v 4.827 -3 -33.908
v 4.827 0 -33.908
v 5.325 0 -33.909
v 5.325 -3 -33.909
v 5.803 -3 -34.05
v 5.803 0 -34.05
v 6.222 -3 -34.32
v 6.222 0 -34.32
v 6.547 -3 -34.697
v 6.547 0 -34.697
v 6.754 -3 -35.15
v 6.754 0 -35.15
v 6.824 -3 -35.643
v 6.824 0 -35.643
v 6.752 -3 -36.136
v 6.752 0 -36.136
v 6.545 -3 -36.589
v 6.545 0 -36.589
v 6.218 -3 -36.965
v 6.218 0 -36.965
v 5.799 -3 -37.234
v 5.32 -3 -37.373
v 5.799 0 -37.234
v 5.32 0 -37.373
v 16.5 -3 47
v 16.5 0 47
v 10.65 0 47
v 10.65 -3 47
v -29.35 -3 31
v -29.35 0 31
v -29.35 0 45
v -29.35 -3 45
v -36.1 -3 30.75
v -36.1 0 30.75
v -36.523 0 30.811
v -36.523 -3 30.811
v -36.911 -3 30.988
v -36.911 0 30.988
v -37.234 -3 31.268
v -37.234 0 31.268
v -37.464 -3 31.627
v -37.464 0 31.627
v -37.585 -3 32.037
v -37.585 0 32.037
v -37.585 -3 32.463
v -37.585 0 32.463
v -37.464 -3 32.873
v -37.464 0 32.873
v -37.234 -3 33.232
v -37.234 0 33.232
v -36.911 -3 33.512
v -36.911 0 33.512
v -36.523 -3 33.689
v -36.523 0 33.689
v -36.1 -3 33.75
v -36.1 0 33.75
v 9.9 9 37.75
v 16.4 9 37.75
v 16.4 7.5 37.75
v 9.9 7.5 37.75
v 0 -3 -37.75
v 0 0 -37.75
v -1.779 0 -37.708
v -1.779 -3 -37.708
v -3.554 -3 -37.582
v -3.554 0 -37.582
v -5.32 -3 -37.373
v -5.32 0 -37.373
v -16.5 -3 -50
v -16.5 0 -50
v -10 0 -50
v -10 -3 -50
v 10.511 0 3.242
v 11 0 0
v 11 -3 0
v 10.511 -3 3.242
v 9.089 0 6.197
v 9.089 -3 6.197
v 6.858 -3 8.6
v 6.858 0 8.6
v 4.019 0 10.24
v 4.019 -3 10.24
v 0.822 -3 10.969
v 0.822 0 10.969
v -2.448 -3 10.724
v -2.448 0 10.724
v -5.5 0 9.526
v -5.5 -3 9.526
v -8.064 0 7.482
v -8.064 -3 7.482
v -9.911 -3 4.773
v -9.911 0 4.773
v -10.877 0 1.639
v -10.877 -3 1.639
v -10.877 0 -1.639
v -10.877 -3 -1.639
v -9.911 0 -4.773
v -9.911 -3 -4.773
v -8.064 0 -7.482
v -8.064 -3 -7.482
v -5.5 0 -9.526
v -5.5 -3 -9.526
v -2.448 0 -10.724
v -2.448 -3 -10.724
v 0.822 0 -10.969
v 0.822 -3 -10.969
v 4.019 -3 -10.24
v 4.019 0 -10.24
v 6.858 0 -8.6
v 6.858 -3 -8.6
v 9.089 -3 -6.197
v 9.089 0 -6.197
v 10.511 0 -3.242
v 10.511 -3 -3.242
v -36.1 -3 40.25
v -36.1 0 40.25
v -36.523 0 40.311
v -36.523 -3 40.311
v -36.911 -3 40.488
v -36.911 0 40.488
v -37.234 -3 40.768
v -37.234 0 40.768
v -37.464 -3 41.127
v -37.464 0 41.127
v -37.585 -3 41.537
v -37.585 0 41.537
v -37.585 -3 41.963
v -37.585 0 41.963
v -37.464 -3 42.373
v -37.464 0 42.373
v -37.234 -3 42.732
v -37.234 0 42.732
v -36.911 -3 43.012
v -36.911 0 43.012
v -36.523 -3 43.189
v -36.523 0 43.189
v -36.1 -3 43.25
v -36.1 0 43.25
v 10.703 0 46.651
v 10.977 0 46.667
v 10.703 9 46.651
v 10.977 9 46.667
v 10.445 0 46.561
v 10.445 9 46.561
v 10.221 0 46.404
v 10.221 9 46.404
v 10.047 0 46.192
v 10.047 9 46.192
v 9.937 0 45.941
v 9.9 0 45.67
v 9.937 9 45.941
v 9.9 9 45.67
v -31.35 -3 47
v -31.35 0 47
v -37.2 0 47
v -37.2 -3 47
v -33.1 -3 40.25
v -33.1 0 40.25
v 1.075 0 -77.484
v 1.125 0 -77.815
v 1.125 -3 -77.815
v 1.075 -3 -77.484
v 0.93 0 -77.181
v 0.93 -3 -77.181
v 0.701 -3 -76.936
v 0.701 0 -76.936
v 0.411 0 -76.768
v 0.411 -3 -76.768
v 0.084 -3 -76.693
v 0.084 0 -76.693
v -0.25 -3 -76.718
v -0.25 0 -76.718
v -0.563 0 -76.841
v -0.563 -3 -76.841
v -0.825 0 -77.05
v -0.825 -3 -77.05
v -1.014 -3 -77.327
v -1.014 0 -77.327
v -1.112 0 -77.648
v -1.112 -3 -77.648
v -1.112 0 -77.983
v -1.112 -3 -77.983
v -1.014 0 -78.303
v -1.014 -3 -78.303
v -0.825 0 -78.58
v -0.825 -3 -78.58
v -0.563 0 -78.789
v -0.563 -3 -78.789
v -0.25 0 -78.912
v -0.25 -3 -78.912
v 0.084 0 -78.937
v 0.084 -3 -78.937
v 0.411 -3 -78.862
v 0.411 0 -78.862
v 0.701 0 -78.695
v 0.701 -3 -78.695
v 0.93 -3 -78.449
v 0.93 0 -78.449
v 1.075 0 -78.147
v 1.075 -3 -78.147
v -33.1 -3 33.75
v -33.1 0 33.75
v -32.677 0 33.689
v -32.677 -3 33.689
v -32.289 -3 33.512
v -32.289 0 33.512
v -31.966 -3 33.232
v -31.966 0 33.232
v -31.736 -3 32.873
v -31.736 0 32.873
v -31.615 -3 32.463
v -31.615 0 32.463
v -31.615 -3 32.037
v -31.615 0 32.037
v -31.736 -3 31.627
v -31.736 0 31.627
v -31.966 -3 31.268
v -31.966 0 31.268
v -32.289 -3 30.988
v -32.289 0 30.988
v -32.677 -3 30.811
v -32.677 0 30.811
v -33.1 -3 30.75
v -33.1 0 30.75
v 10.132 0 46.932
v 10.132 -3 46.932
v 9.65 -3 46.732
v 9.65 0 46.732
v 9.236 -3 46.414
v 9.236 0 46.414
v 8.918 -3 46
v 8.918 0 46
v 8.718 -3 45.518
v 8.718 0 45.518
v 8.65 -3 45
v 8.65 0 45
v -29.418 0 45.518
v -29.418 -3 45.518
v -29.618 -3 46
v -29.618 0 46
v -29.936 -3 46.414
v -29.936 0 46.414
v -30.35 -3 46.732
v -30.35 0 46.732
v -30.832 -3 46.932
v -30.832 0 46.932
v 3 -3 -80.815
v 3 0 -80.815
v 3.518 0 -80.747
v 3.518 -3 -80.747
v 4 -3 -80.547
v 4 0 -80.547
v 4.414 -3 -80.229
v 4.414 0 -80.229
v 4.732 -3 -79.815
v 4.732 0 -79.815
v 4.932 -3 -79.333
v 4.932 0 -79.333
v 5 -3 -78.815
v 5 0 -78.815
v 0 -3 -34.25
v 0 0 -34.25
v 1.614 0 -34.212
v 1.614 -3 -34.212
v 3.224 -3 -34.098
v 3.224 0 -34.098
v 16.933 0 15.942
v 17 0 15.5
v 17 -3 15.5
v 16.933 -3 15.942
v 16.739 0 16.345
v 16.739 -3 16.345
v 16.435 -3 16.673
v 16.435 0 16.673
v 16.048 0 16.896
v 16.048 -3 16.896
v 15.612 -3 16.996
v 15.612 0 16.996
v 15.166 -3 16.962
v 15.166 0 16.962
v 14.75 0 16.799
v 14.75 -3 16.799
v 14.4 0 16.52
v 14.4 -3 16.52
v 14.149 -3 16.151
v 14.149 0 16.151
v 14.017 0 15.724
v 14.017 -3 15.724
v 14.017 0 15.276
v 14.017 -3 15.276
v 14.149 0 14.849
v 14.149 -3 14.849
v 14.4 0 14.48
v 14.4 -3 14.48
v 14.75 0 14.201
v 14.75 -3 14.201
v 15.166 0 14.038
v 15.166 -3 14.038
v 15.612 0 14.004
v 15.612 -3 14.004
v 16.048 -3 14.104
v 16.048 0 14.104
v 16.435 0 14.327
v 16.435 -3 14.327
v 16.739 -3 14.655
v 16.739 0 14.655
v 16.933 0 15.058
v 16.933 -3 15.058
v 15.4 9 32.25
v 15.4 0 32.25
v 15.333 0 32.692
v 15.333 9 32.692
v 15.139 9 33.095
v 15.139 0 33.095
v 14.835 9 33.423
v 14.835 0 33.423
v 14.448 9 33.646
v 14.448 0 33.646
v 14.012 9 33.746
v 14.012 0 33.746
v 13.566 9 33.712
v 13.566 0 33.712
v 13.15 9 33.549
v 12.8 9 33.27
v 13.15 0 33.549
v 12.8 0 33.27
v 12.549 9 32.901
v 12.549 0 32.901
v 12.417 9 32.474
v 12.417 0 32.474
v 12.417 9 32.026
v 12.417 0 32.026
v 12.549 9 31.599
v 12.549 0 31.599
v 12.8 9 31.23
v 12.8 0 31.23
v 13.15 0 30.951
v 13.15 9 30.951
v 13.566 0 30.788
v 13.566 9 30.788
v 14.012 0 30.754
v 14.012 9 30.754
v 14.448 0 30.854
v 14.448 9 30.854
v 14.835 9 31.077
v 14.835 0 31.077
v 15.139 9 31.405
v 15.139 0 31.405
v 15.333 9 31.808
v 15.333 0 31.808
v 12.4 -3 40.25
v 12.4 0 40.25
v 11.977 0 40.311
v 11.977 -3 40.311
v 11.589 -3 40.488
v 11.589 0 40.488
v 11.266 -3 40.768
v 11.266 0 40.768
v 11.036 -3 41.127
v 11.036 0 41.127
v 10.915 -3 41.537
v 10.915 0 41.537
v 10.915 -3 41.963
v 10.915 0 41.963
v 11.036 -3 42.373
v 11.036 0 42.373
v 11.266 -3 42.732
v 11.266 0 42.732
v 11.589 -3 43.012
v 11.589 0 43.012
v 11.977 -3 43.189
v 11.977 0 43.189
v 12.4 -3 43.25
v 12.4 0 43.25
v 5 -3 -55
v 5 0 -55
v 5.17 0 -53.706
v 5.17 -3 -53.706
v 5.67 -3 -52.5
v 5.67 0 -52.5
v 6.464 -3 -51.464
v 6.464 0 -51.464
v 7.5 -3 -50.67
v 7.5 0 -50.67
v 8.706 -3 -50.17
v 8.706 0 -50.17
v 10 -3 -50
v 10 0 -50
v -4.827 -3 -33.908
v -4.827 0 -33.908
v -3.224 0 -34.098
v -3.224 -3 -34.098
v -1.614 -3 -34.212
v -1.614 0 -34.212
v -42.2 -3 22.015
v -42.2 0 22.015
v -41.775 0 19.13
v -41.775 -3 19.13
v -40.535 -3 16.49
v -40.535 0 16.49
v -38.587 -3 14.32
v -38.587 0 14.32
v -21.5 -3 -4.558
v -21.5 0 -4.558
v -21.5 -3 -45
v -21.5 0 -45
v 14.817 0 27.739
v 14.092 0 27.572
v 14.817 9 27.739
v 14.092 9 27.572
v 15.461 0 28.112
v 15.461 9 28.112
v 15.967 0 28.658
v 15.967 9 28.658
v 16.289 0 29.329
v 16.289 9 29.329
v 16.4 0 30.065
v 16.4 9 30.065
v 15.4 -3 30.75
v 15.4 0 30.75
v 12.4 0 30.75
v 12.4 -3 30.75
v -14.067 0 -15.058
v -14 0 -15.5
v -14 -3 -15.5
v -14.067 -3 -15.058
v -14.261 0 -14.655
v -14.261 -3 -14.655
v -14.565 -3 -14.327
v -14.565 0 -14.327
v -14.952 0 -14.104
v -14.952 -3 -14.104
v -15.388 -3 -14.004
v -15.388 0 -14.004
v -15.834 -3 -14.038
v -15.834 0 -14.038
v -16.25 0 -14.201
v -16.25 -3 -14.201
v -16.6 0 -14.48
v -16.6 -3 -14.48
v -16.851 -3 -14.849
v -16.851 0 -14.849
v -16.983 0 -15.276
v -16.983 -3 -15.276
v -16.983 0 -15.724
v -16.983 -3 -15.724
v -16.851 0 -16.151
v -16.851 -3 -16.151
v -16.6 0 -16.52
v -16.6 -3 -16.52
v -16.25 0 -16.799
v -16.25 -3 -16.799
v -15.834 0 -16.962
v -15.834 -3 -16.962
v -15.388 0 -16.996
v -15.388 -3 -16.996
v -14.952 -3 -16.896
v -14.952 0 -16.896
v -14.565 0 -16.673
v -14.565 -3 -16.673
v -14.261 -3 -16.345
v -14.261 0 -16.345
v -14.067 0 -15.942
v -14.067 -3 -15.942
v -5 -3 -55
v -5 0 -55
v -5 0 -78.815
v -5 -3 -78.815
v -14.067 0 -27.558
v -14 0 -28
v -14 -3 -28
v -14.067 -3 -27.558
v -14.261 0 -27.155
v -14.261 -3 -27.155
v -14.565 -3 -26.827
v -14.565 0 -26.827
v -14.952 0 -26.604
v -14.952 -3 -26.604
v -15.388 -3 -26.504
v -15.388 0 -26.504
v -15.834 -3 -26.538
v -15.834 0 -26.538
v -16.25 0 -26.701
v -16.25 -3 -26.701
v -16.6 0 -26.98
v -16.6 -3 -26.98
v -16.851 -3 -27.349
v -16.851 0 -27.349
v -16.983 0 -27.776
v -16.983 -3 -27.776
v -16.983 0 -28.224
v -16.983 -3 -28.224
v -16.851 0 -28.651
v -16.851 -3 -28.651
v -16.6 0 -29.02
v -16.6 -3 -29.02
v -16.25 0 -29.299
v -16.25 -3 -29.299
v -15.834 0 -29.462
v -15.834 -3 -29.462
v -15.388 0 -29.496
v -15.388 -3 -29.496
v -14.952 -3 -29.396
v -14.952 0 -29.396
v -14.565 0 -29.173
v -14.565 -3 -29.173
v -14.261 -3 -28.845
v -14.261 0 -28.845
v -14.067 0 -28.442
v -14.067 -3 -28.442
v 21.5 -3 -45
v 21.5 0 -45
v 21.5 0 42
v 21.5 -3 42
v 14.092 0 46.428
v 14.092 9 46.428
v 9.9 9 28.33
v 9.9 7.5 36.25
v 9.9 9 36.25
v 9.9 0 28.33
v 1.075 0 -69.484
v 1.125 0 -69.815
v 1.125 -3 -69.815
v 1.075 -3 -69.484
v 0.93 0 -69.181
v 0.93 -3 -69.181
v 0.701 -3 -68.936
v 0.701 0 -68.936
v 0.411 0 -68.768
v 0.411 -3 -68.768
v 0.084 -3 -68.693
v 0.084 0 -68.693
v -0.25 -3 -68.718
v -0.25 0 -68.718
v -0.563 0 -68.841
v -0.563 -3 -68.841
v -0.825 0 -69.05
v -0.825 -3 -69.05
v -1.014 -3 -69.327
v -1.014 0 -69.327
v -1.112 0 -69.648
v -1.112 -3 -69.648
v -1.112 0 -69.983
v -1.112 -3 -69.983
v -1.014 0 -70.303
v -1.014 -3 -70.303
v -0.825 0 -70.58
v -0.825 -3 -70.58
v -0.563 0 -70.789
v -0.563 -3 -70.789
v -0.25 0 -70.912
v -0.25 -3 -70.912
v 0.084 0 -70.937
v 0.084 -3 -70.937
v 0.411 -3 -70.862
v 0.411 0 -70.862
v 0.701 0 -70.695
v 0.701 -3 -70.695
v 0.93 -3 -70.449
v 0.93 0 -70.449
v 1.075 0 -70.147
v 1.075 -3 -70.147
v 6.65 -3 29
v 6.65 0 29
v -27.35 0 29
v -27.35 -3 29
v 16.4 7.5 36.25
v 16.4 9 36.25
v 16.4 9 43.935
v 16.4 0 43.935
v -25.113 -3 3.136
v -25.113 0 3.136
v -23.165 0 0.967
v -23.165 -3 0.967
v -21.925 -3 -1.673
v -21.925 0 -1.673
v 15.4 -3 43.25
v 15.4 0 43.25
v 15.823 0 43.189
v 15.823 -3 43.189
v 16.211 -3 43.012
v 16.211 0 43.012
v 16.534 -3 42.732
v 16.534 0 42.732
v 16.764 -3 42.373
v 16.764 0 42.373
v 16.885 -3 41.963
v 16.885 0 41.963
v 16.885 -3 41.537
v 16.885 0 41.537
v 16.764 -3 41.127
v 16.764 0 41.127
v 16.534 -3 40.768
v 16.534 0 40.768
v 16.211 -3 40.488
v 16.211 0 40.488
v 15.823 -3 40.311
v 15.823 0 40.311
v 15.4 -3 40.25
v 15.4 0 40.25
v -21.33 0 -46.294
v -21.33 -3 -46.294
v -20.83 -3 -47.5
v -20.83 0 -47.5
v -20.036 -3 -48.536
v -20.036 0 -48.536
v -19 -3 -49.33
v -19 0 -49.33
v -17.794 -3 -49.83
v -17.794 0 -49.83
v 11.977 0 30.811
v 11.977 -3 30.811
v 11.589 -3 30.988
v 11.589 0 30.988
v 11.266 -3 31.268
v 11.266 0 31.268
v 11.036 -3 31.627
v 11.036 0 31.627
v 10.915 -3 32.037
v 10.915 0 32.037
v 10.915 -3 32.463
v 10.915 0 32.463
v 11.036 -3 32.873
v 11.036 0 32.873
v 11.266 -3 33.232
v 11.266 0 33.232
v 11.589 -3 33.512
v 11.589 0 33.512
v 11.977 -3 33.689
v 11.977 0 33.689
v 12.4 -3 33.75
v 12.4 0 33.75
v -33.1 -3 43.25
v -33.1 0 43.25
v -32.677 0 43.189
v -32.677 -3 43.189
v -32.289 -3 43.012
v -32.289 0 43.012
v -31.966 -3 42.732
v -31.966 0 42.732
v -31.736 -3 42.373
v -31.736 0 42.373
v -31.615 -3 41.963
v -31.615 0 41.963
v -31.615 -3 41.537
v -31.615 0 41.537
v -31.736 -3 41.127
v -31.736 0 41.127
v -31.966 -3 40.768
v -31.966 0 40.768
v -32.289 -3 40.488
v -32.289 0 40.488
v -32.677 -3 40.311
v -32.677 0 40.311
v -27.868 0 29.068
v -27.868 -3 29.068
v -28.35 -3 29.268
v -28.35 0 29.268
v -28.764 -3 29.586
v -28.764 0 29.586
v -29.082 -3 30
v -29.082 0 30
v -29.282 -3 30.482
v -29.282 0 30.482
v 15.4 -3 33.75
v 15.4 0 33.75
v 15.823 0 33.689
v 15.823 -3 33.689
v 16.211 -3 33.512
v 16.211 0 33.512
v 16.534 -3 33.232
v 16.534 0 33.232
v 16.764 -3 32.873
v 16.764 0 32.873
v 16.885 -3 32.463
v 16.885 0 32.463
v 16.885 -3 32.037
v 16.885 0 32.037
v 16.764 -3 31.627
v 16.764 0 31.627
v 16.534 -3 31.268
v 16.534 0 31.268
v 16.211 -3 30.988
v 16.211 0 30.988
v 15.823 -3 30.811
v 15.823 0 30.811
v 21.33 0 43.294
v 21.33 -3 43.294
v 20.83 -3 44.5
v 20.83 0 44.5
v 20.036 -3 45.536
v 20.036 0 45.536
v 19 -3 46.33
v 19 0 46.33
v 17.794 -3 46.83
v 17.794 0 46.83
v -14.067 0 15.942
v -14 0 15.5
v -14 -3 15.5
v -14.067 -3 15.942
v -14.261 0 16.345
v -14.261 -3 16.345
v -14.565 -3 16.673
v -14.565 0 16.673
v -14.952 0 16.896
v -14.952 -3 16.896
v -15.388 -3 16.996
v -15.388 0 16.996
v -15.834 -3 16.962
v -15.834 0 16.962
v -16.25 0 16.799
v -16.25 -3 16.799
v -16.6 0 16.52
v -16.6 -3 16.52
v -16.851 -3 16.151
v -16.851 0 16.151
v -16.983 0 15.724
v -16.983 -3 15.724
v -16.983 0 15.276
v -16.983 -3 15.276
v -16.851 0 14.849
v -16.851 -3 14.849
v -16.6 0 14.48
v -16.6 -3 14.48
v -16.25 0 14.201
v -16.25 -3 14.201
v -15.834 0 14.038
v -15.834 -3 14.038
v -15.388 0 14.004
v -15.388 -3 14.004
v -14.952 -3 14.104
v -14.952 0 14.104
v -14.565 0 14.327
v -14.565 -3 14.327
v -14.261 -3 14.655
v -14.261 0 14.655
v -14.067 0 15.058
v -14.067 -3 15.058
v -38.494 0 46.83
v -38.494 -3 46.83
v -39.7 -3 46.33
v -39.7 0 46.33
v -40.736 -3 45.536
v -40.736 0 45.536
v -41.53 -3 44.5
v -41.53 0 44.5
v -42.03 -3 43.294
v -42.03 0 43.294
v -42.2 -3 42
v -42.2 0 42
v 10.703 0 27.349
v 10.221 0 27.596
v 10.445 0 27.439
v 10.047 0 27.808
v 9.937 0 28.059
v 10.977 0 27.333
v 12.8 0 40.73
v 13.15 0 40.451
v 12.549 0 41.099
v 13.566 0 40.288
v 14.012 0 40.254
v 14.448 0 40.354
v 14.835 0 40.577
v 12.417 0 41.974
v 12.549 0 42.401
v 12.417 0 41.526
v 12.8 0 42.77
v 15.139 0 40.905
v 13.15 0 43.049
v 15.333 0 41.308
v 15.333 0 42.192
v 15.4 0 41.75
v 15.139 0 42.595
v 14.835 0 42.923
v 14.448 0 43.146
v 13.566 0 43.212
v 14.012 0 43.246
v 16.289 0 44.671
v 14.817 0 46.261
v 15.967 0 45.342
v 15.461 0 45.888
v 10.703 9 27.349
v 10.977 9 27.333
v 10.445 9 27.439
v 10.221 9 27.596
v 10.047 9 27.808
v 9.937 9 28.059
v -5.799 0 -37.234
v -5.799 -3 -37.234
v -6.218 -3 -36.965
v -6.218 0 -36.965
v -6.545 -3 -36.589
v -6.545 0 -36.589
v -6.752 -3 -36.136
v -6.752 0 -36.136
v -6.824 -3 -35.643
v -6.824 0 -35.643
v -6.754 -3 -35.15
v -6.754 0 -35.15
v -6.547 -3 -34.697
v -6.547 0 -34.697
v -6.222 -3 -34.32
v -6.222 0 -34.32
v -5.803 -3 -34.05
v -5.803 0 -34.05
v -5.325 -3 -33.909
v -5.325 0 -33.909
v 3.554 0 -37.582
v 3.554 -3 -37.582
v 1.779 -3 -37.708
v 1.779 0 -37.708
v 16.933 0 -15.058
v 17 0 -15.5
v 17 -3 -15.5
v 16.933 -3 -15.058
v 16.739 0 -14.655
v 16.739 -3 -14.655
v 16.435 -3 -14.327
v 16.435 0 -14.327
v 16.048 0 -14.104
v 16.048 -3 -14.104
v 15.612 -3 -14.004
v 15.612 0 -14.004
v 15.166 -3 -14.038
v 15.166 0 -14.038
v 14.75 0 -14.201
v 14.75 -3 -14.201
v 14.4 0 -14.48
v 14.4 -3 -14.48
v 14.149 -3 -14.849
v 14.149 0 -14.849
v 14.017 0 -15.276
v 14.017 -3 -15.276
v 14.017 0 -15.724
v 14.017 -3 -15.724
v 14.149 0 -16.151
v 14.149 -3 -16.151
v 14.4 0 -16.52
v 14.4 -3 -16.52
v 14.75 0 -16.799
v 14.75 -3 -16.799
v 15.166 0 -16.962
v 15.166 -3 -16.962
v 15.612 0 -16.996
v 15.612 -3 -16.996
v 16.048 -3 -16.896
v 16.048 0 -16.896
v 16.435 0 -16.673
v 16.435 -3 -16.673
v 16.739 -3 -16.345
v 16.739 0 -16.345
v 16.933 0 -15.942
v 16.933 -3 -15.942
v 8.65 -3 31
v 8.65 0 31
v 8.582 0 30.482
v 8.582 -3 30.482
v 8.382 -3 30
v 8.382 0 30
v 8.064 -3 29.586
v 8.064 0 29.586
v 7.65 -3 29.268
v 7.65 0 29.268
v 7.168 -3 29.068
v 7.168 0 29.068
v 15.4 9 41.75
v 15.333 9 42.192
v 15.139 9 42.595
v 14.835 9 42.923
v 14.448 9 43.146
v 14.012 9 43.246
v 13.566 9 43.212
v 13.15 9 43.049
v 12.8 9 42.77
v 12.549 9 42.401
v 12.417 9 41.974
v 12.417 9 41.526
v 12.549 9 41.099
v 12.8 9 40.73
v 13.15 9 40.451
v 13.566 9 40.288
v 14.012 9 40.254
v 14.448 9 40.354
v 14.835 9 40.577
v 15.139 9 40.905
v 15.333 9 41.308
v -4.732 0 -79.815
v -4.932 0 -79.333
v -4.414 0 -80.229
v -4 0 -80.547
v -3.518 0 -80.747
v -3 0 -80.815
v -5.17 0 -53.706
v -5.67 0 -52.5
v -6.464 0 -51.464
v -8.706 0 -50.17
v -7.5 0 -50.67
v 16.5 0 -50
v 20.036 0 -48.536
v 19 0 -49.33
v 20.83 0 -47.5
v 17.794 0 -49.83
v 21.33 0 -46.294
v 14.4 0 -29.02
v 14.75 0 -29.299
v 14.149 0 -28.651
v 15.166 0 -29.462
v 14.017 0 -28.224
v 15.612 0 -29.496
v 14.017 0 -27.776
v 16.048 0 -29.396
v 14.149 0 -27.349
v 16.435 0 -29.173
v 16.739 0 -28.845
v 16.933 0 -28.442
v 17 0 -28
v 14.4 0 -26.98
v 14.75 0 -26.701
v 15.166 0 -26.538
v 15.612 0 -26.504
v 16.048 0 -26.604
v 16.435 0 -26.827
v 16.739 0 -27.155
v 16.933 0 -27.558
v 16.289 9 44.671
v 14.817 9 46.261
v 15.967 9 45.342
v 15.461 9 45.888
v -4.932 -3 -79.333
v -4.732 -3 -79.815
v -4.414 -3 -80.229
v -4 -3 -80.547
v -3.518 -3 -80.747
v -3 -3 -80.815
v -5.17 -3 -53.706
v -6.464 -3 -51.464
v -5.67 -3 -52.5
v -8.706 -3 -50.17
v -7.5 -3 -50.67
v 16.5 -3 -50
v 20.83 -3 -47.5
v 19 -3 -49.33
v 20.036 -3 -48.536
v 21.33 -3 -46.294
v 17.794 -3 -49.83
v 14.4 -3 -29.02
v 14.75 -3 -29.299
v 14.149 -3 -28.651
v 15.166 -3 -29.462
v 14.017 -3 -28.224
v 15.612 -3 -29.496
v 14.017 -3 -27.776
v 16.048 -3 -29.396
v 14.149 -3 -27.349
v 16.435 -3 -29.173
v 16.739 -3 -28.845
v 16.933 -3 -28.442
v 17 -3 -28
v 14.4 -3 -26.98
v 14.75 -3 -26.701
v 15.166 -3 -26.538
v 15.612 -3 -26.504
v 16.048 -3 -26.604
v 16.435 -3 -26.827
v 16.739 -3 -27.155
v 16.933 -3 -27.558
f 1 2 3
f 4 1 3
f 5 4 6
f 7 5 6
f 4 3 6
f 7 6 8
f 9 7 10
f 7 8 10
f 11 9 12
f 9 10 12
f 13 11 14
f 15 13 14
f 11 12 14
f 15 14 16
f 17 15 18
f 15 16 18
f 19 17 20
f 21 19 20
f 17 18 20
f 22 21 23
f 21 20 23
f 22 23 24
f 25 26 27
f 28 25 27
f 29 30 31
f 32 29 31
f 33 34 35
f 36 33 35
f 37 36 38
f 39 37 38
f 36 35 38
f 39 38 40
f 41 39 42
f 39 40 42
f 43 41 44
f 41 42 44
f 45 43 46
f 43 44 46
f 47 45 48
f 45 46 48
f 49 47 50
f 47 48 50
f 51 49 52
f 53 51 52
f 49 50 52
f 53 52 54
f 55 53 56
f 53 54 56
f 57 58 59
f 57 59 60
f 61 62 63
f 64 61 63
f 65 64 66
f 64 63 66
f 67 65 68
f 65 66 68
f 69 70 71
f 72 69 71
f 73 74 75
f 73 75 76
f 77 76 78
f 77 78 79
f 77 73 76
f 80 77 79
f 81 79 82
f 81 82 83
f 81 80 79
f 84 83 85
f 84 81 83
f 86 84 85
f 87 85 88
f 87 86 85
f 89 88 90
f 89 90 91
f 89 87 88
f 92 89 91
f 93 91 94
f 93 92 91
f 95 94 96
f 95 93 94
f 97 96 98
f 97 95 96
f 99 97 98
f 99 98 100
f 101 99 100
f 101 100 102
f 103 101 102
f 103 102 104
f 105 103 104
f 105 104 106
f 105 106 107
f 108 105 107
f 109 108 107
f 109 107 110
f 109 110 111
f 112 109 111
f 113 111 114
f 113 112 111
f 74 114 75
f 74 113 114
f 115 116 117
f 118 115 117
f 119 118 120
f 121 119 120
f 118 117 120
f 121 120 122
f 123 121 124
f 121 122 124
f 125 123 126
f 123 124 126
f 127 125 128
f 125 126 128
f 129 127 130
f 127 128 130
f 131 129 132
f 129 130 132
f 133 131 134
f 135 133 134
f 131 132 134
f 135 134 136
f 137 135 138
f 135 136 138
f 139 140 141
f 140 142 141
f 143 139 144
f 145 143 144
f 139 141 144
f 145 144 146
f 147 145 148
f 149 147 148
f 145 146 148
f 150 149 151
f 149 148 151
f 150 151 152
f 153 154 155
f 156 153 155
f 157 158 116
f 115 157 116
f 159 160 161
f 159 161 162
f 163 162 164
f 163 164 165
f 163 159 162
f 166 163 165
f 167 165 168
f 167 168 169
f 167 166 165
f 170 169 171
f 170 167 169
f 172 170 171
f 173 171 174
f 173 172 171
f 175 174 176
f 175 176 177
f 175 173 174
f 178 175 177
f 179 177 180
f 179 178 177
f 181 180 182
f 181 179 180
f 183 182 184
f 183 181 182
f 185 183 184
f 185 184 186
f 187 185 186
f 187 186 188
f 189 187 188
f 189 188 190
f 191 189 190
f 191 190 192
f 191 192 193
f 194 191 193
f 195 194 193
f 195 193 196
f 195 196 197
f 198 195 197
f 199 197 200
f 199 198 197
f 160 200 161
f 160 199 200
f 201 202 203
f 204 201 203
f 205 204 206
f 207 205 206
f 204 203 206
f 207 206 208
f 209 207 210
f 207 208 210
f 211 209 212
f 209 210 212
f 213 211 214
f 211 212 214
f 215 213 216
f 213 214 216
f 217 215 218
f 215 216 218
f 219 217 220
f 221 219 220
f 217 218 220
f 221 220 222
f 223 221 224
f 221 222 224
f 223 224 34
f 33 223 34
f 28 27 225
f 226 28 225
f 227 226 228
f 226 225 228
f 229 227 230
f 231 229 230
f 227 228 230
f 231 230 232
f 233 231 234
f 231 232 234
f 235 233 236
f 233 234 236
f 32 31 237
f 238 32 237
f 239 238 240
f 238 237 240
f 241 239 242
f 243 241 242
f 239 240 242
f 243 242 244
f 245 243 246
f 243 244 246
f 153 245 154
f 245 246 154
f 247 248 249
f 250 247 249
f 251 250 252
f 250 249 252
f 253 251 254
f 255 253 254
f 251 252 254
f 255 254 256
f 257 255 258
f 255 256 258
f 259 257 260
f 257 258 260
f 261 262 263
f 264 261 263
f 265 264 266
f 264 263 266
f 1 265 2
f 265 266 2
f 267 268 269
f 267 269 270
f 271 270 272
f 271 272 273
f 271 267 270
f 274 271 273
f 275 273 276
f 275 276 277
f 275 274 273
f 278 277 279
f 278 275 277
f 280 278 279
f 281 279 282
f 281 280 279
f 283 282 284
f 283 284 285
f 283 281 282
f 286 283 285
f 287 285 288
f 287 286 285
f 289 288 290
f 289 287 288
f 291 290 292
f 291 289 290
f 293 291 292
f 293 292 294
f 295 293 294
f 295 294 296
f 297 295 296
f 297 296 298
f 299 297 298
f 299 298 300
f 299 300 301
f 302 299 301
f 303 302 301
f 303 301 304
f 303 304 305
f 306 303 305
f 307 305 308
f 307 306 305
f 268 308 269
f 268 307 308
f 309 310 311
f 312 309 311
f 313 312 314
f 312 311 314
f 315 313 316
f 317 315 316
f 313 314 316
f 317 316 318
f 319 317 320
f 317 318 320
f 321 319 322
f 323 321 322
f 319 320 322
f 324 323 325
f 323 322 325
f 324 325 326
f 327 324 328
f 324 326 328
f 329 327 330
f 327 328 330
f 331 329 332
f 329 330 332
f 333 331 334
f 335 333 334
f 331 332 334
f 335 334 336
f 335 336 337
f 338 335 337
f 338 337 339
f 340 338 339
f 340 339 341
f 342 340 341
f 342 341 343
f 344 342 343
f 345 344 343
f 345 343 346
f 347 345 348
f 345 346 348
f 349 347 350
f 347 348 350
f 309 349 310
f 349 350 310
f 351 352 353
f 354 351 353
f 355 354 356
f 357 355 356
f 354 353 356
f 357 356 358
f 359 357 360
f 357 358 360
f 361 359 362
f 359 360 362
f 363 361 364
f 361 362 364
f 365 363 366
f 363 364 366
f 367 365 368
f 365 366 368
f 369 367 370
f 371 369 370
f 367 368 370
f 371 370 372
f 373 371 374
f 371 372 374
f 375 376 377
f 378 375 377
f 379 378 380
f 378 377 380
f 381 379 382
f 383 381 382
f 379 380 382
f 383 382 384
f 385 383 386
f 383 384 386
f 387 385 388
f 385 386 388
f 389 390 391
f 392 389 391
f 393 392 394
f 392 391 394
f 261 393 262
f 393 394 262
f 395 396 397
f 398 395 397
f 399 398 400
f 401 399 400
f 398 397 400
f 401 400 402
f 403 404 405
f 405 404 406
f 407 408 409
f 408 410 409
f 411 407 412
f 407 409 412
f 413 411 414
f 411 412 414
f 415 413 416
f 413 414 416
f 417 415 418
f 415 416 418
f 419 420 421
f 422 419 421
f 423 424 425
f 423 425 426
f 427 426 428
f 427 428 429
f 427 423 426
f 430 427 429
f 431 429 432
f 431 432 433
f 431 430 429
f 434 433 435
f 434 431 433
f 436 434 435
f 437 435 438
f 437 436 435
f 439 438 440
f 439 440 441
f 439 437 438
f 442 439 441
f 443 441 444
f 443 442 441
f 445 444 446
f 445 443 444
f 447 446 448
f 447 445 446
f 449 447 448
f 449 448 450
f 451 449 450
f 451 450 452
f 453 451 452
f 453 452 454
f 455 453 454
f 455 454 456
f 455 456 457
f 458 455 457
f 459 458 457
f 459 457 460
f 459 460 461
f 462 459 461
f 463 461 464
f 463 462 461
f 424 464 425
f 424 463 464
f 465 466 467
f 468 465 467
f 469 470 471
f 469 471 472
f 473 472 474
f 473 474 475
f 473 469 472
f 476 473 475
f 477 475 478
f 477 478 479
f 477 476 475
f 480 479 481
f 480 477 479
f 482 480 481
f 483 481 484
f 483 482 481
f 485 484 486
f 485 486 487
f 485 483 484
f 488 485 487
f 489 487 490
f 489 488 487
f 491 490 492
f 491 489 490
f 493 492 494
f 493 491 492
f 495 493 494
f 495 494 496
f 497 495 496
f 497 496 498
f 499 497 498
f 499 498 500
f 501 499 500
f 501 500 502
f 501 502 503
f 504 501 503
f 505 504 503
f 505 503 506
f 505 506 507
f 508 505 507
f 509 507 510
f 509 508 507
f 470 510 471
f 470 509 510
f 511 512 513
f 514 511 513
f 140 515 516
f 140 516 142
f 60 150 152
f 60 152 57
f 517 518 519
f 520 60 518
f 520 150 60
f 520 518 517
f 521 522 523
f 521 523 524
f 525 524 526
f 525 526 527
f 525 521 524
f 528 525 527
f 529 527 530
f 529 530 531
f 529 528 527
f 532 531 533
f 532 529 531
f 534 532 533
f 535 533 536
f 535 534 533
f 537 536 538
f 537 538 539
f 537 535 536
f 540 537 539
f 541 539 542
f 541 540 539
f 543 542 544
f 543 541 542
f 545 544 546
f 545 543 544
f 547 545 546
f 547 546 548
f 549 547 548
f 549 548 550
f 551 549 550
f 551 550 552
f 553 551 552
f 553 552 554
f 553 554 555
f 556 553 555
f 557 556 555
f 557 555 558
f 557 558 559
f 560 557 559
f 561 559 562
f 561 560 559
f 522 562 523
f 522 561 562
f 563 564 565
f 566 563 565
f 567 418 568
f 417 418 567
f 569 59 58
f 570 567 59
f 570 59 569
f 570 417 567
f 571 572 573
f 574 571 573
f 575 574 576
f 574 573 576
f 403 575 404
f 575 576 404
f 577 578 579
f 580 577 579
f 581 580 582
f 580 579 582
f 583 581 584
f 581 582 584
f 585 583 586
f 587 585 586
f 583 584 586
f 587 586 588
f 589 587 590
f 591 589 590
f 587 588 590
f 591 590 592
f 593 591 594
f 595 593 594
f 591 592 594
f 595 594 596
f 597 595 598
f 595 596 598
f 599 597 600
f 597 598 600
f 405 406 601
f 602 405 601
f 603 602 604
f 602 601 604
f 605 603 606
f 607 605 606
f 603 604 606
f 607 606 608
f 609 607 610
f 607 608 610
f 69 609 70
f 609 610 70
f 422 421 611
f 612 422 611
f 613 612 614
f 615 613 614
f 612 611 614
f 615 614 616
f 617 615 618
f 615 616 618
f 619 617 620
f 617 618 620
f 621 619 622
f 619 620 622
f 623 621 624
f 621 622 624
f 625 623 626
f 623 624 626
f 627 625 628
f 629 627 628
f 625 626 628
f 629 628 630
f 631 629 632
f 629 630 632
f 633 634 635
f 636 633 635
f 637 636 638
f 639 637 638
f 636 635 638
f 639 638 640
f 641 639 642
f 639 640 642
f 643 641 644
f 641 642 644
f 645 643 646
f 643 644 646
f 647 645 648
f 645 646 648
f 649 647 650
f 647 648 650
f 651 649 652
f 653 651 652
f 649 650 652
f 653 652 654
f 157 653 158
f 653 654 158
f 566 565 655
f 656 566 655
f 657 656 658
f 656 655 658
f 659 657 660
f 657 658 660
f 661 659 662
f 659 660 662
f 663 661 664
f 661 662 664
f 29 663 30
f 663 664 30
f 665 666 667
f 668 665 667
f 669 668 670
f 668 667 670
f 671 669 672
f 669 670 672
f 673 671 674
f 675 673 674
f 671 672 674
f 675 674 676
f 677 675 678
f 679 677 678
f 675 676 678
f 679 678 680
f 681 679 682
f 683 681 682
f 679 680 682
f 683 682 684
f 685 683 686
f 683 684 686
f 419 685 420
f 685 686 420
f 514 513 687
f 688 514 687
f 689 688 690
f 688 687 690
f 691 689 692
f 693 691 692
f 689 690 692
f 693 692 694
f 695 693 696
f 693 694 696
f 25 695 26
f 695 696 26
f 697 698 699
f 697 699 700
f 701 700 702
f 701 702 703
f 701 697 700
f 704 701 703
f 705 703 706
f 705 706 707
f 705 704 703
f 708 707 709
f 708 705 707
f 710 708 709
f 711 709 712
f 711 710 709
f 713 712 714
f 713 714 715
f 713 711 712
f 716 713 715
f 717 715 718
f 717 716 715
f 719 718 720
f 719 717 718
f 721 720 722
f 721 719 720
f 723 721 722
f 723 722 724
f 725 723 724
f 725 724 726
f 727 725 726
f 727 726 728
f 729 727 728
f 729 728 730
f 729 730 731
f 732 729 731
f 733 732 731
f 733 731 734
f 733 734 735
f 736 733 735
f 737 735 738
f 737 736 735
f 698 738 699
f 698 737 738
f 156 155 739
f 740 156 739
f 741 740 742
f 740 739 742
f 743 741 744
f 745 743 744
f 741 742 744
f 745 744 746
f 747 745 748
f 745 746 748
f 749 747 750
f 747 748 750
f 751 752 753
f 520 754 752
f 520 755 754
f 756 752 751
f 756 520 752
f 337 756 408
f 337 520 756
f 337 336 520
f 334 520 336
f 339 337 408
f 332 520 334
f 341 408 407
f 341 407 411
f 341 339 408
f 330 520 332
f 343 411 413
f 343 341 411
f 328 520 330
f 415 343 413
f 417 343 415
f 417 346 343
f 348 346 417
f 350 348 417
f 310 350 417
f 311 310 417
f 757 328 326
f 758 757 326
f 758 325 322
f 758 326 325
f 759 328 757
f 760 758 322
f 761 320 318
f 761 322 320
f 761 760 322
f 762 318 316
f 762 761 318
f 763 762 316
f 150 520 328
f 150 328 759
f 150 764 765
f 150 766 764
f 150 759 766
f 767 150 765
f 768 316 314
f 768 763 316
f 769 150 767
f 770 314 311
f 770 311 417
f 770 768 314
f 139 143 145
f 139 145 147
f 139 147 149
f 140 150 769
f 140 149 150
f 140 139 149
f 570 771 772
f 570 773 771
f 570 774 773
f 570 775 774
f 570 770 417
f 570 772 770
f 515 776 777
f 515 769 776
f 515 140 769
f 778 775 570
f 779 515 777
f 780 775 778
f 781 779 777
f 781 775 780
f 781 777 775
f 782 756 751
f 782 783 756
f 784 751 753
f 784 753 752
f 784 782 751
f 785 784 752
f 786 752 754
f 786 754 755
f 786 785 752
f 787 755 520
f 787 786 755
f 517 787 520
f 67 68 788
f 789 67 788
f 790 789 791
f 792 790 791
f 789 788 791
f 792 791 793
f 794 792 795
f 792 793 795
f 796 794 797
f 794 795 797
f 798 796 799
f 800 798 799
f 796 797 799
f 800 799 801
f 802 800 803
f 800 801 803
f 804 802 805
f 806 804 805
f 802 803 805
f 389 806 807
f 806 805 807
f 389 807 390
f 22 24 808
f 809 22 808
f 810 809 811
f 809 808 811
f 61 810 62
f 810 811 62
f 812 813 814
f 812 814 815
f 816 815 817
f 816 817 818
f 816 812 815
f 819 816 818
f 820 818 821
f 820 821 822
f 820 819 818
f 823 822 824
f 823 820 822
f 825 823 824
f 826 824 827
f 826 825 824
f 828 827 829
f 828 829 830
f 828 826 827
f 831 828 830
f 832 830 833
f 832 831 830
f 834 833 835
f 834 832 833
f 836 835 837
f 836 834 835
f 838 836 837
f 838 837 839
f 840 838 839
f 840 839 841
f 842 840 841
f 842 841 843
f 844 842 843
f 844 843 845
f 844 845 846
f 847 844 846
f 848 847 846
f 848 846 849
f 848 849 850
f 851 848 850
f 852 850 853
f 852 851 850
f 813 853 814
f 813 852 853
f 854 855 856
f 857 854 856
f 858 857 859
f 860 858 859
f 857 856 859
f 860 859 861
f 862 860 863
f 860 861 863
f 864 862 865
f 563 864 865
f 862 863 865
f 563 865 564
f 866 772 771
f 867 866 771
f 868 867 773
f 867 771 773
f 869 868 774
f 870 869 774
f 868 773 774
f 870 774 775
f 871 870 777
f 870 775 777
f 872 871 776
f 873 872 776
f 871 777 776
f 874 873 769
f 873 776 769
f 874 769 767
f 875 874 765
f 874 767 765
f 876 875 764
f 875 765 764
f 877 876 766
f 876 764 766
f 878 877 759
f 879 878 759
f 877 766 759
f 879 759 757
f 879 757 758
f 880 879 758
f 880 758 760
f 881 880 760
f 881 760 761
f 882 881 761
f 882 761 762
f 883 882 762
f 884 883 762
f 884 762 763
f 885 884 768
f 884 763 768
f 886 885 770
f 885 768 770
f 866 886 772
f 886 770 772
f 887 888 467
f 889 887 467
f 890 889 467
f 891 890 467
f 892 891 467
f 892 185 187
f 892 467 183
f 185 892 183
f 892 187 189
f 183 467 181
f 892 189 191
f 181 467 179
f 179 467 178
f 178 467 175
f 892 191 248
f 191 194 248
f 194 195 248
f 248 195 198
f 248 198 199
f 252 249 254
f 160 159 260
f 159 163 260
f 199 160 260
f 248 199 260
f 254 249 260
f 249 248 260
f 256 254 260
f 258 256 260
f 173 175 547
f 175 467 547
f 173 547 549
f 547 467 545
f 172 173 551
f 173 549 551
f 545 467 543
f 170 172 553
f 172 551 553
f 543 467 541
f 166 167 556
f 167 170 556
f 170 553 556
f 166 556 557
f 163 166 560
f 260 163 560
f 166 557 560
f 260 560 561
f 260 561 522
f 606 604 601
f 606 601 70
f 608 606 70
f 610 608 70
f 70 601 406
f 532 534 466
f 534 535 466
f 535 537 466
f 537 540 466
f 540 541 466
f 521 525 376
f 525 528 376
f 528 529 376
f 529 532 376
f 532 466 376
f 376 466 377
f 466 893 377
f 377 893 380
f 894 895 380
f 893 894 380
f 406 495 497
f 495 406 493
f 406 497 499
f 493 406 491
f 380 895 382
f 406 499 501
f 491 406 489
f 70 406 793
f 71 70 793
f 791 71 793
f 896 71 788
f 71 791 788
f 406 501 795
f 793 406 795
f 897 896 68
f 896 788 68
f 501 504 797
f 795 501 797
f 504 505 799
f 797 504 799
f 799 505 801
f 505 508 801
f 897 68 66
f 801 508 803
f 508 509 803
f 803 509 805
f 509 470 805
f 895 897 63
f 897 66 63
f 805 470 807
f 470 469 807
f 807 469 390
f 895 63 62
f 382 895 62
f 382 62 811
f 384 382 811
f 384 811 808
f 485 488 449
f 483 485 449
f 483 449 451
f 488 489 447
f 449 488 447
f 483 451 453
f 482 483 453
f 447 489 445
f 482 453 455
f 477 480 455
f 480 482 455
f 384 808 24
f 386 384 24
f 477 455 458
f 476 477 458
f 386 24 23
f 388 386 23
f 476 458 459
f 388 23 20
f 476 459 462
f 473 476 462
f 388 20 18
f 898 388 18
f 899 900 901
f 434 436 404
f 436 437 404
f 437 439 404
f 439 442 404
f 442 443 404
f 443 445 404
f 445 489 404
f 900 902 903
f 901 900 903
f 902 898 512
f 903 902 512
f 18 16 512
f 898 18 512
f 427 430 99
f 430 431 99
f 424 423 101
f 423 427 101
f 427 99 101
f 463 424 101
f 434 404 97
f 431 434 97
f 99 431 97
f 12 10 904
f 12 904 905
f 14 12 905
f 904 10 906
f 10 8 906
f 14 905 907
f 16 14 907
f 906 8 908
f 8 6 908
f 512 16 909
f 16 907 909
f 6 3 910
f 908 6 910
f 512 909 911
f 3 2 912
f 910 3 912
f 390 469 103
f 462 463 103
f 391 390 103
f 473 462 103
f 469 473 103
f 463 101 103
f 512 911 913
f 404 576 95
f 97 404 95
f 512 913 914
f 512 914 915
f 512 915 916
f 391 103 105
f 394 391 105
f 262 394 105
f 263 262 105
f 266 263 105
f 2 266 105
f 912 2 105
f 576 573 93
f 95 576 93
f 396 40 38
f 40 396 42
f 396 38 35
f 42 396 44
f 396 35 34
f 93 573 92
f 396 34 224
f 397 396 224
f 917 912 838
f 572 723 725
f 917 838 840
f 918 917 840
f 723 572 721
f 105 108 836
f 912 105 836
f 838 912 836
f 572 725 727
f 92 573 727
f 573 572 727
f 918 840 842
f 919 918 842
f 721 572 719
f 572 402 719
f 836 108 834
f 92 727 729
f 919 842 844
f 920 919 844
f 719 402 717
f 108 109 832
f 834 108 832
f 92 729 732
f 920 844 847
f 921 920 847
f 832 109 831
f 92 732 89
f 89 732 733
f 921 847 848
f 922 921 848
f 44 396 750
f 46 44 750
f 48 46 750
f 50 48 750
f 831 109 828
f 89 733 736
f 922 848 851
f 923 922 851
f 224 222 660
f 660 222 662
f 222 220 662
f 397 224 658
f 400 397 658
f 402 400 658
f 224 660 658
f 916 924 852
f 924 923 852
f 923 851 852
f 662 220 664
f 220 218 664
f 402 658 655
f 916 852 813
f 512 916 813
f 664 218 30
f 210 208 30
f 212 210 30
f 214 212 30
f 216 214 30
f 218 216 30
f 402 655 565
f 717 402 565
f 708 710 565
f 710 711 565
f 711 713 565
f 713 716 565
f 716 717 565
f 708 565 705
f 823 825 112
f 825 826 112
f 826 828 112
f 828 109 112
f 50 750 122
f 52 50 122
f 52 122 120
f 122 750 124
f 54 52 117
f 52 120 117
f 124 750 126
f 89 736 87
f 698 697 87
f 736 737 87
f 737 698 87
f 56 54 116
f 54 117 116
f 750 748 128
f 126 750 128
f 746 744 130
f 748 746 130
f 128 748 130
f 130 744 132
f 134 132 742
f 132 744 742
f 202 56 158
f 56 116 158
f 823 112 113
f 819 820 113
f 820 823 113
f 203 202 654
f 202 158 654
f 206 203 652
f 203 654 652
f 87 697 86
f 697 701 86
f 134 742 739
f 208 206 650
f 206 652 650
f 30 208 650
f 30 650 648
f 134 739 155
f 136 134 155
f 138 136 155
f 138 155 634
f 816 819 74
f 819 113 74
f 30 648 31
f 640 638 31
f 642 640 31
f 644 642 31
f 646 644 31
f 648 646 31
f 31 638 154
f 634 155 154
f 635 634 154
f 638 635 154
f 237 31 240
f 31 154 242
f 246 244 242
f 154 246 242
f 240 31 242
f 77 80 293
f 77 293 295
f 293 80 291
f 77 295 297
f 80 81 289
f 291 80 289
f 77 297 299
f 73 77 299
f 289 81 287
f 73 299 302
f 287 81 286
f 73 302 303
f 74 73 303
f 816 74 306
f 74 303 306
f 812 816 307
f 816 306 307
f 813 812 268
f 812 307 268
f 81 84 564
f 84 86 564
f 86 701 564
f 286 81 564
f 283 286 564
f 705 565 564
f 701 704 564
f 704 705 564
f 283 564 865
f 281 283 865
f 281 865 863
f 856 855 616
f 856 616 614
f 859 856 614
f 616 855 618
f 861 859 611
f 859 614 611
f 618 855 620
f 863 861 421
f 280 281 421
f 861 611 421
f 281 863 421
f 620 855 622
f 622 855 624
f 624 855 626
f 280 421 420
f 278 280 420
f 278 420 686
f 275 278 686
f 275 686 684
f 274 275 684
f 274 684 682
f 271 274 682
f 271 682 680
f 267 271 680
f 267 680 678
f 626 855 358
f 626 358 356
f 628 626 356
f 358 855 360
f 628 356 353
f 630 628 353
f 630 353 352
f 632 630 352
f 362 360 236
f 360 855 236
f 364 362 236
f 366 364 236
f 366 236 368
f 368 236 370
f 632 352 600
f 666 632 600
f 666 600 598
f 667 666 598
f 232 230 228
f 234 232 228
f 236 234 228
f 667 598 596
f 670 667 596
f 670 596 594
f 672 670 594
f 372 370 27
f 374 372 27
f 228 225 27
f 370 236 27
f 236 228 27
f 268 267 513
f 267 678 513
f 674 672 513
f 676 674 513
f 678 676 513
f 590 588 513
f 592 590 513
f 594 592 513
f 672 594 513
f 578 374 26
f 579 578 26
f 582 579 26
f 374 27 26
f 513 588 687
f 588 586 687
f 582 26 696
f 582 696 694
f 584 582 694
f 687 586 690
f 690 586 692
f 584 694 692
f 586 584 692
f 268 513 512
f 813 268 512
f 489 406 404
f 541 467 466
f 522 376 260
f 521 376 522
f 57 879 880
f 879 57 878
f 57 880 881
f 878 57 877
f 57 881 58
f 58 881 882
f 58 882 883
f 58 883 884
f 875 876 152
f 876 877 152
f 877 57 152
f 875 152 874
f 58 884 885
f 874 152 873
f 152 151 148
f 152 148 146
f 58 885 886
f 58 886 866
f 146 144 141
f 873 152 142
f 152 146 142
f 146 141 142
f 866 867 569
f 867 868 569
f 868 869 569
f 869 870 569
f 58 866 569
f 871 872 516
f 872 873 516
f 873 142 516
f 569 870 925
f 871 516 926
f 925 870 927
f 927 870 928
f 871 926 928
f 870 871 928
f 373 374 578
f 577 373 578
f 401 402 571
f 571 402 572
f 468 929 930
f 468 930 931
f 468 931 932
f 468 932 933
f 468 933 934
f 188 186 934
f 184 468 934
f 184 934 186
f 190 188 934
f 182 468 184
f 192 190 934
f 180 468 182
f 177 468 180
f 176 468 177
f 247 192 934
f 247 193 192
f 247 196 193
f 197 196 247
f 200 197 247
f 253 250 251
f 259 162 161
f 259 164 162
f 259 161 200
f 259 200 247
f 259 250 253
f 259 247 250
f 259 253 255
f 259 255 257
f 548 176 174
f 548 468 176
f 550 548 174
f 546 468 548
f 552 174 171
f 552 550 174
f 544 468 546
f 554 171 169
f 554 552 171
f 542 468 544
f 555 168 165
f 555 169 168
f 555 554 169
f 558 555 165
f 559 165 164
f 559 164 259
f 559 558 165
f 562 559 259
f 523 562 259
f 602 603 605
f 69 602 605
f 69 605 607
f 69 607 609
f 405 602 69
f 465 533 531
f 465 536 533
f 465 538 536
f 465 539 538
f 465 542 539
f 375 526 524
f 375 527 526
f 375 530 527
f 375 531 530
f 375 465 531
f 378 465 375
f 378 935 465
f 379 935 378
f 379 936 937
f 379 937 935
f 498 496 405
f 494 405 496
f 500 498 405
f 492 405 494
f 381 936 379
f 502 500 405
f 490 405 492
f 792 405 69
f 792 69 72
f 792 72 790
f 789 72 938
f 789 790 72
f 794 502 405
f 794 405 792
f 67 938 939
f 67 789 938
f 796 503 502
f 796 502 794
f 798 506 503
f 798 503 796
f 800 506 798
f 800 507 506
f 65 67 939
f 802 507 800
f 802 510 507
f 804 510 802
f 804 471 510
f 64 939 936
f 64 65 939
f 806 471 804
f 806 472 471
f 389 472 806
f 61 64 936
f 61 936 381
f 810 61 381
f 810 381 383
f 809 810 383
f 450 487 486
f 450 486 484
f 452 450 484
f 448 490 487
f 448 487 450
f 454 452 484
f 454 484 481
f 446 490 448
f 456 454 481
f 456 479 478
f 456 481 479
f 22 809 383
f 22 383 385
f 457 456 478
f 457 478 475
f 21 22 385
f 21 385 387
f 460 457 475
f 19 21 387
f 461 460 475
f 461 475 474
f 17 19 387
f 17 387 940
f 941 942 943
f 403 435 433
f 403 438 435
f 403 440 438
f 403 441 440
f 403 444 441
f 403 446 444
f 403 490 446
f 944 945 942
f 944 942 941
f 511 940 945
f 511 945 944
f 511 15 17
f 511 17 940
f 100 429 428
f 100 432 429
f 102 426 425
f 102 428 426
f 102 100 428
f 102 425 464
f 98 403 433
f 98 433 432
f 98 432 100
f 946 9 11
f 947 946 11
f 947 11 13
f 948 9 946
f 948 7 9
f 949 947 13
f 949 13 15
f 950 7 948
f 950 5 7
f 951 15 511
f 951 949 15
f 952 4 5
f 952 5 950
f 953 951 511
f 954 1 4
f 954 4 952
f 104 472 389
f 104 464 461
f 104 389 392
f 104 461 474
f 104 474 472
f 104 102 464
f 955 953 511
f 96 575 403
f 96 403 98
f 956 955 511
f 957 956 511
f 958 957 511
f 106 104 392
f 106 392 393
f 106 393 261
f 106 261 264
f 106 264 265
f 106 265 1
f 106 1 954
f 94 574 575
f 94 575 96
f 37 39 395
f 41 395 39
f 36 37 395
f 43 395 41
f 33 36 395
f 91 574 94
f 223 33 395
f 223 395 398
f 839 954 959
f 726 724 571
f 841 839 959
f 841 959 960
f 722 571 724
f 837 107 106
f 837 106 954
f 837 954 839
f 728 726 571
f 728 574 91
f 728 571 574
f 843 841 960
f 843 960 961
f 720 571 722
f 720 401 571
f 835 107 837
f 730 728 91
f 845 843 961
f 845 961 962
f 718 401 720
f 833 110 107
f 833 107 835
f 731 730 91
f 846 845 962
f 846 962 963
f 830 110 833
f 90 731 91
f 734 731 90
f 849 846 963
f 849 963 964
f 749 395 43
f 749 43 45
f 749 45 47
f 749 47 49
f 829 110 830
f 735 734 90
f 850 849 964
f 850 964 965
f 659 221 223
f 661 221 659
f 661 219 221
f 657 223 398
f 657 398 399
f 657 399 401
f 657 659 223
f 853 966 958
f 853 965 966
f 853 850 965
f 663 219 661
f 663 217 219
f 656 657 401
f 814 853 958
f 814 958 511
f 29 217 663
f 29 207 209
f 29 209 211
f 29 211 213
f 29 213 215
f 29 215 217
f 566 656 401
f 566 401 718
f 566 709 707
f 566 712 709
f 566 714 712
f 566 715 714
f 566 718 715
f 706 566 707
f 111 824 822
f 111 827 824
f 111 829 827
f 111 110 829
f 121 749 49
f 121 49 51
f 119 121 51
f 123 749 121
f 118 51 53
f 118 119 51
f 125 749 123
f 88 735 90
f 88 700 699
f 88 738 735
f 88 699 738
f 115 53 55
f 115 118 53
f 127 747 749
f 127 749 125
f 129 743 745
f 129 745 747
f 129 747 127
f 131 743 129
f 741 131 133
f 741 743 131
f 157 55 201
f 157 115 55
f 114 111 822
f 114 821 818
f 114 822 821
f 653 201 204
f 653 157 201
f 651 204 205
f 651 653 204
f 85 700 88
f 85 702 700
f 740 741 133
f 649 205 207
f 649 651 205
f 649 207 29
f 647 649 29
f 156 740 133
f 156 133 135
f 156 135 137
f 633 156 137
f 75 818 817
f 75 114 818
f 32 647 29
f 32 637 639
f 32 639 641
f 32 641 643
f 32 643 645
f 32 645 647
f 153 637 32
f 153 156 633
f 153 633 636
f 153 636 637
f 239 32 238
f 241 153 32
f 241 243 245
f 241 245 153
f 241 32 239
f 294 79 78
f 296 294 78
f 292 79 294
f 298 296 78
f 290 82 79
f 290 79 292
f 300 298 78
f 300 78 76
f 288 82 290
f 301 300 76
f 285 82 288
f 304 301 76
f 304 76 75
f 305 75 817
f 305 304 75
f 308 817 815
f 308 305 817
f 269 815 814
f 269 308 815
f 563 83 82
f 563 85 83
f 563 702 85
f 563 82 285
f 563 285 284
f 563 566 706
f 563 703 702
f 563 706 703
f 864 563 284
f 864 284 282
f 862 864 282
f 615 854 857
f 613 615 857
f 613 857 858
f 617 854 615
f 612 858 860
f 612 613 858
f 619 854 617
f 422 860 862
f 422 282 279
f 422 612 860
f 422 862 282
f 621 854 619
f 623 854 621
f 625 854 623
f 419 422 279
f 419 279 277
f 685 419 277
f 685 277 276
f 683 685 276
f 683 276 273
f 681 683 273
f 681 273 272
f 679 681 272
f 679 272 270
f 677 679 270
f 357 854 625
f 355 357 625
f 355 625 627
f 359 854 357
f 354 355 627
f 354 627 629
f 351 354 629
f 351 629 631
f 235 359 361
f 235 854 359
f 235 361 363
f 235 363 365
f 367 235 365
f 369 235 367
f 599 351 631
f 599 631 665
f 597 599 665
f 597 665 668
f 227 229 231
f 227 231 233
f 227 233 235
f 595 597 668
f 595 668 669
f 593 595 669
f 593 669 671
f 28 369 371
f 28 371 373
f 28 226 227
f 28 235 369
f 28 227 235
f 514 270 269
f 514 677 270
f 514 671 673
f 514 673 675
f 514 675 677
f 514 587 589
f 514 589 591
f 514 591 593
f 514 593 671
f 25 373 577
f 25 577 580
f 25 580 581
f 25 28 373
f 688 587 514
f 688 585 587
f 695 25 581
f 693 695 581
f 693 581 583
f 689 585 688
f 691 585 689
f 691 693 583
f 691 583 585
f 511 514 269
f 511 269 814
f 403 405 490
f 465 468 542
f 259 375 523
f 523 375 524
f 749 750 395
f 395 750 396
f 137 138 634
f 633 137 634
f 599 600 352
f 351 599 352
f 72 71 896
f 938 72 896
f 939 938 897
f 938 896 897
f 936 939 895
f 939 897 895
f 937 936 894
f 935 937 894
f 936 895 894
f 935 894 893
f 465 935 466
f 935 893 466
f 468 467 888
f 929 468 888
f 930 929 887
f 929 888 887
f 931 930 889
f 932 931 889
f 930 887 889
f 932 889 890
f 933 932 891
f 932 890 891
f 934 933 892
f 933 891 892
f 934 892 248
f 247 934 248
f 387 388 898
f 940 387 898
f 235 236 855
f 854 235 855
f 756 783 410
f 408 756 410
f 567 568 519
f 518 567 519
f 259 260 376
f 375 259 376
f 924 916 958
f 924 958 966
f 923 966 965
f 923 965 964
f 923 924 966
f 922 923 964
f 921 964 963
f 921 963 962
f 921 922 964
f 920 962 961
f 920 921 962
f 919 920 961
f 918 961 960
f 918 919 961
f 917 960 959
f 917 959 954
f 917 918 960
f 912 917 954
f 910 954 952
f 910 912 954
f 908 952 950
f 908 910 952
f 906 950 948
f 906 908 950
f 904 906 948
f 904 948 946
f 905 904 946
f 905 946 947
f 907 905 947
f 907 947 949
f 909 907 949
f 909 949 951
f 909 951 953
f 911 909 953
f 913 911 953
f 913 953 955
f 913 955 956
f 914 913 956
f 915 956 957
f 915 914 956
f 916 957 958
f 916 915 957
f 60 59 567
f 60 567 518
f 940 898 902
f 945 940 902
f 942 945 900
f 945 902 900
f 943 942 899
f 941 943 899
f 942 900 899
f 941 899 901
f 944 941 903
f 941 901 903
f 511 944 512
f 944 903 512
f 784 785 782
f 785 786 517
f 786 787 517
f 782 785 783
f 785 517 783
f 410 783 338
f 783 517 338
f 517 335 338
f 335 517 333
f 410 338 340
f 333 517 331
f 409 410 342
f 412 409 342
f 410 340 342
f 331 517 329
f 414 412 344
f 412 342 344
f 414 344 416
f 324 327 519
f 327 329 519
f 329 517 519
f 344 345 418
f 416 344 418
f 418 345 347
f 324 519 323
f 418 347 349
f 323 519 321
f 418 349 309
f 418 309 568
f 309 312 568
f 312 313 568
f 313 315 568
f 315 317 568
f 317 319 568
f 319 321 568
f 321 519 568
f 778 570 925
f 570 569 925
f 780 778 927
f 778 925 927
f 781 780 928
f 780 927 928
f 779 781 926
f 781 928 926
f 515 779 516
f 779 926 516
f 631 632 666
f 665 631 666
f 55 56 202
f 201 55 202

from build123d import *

# Parameters (mm, degrees)
F1_R     = 1.5
F1_R_2   = 1.125
F1_R_3   = 11
F2_DEPTH = 3
F3_R     = 1.5
F4_DEPTH = 9
F5_W     = 6.5
F5_H     = 1.5
F6_DEPTH = 1.5
F7_R     = 1
F8_R     = 2.5


with BuildPart() as f2:
    # F1 (on Front) → F2 (new body)
    with BuildSketch(Plane.XZ):
        with BuildLine():
            ThreePointArc((16.5, -50), (20.035534, -48.535534), (21.5, -45))
            Line((21.5, -45), (21.5, 42))
            ThreePointArc((21.5, 42), (20.035534, 45.535534), (16.5, 47))
            Line((16.5, 47), (10.65, 47))
            ThreePointArc((10.65, 47), (9.235786, 46.414214), (8.65, 45))
            Line((8.65, 45), (8.65, 31))
            ThreePointArc((8.65, 31), (8.064214, 29.585786), (6.65, 29))
            Line((6.65, 29), (-27.35, 29))
            ThreePointArc((-27.35, 29), (-28.764214, 29.585786), (-29.35, 31))
            Line((-29.35, 31), (-29.35, 45))
            ThreePointArc((-29.35, 45), (-29.935786, 46.414214), (-31.35, 47))
            Line((-31.35, 47), (-37.2, 47))
            ThreePointArc((-37.2, 47), (-40.735534, 45.535534), (-42.2, 42))
            Line((-42.2, 42), (-42.2, 22.015033))
            ThreePointArc((-42.2, 22.015033), (-41.251777, 17.7647), (-38.586933, 14.320419))
            Line((-38.586933, 14.320419), (-25.113067, 3.136405))
            ThreePointArc((-25.113067, 3.136405), (-22.448223, -0.307876), (-21.5, -4.558209))
            Line((-21.5, -4.558209), (-21.5, -45))
            ThreePointArc((-21.5, -45), (-20.035534, -48.535534), (-16.5, -50))
            Line((-16.5, -50), (-10, -50))
            ThreePointArc((-10, -50), (-6.464466, -51.464466), (-5, -55))
            Line((-5, -55), (-5, -78.815218))
            ThreePointArc((-5, -78.815218), (-4.414214, -80.229432), (-3, -80.815218))
            Line((-3, -80.815218), (3, -80.815218))
            ThreePointArc((3, -80.815218), (4.414214, -80.229432), (5, -78.815218))
            Line((5, -78.815218), (5, -55))
            ThreePointArc((5, -55), (6.464466, -51.464466), (10, -50))
            Line((10, -50), (16.5, -50))
        make_face()
        with Locations((-15.5, -28)):
            Circle(F1_R, mode=Mode.SUBTRACT)
        with Locations((0, -77.815218)):
            Circle(F1_R_2, mode=Mode.SUBTRACT)
        with Locations((0, -69.815218)):
            Circle(F1_R_2, mode=Mode.SUBTRACT)
        with BuildLine():
            ThreePointArc((0, -34.25), (2.419604, -34.164426), (4.827117, -33.908132))
            ThreePointArc((4.827117, -33.908132), (6.80629, -35.394024), (5.320399, -37.373197))
            ThreePointArc((5.320399, -37.373197), (2.666863, -37.655681), (0, -37.75))
            ThreePointArc((0, -37.75), (-2.666863, -37.655681), (-5.320399, -37.373197))
            ThreePointArc((-5.320399, -37.373197), (-6.80629, -35.394024), (-4.827117, -33.908132))
            ThreePointArc((-4.827117, -33.908132), (-2.419604, -34.164426), (0, -34.25))
        make_face(mode=Mode.SUBTRACT)
        with Locations((15.5, -28)):
            Circle(F1_R, mode=Mode.SUBTRACT)
        with Locations((-15.5, -15.5)):
            Circle(F1_R, mode=Mode.SUBTRACT)
        with BuildLine():
            ThreePointArc((-36.1, 30.75), (-37.6, 32.25), (-36.1, 33.75))
            Line((-36.1, 33.75), (-33.1, 33.75))
            ThreePointArc((-33.1, 33.75), (-31.6, 32.25), (-33.1, 30.75))
            Line((-33.1, 30.75), (-36.1, 30.75))
        make_face(mode=Mode.SUBTRACT)
        with BuildLine():
            Line((-33.1, 40.25), (-36.1, 40.25))
            ThreePointArc((-36.1, 40.25), (-37.6, 41.75), (-36.1, 43.25))
            Line((-36.1, 43.25), (-33.1, 43.25))
            ThreePointArc((-33.1, 43.25), (-31.6, 41.75), (-33.1, 40.25))
        make_face(mode=Mode.SUBTRACT)
        with Locations((-15.5, 15.5)):
            Circle(F1_R, mode=Mode.SUBTRACT)
        Circle(F1_R_3, mode=Mode.SUBTRACT)
        with Locations((15.5, -15.5)):
            Circle(F1_R, mode=Mode.SUBTRACT)
        with Locations((15.5, 15.5)):
            Circle(F1_R, mode=Mode.SUBTRACT)
        with BuildLine():
            Line((15.4, 30.75), (12.4, 30.75))
            ThreePointArc((12.4, 30.75), (10.9, 32.25), (12.4, 33.75))
            Line((12.4, 33.75), (15.4, 33.75))
            ThreePointArc((15.4, 33.75), (16.9, 32.25), (15.4, 30.75))
        make_face(mode=Mode.SUBTRACT)
        with BuildLine():
            Line((15.4, 40.25), (12.4, 40.25))
            ThreePointArc((12.4, 40.25), (10.9, 41.75), (12.4, 43.25))
            Line((12.4, 43.25), (15.4, 43.25))
            ThreePointArc((15.4, 43.25), (16.9, 41.75), (15.4, 40.25))
        make_face(mode=Mode.SUBTRACT)
    extrude(amount=F2_DEPTH)


with BuildPart() as f4:
    # F3 (on Front) → F4 (new body)
    with BuildSketch(Plane.XZ):
        Polygon((16.4, 27.75), (16.4, 46.25), (9.9, 46.75), (9.9, 27.25), align=None)
        with Locations((13.9, 32.25)):
            Circle(F3_R, mode=Mode.SUBTRACT)
        with Locations((13.9, 41.75)):
            Circle(F3_R, mode=Mode.SUBTRACT)
    extrude(amount=-F4_DEPTH)

    # F5 (on face) → F6 (cut)
    with BuildSketch(Plane(origin=(0, 9, 0), x_dir=(-1, 0, 0), z_dir=(0, 1, 0))):
        with Locations((-13.15, 37)):
            Rectangle(F5_W, F5_H)
    extrude(amount=-F6_DEPTH, mode=Mode.SUBTRACT)

    # F7
    f7_edges = [f4.edges().sort_by_distance(p)[0] for p in [
        (9.9, 4.5, 46.75),
        (9.9, 4.5, 27.25),
    ]]
    fillet(f7_edges, radius=F7_R)

    # F8
    f8_edges = [f4.edges().sort_by_distance(p)[0] for p in [
        (16.4, 4.5, 27.75),
        (16.4, 4.5, 46.25),
    ]]
    fillet(f8_edges, radius=F8_R)


solid = Compound([f2.part, f4.part])
